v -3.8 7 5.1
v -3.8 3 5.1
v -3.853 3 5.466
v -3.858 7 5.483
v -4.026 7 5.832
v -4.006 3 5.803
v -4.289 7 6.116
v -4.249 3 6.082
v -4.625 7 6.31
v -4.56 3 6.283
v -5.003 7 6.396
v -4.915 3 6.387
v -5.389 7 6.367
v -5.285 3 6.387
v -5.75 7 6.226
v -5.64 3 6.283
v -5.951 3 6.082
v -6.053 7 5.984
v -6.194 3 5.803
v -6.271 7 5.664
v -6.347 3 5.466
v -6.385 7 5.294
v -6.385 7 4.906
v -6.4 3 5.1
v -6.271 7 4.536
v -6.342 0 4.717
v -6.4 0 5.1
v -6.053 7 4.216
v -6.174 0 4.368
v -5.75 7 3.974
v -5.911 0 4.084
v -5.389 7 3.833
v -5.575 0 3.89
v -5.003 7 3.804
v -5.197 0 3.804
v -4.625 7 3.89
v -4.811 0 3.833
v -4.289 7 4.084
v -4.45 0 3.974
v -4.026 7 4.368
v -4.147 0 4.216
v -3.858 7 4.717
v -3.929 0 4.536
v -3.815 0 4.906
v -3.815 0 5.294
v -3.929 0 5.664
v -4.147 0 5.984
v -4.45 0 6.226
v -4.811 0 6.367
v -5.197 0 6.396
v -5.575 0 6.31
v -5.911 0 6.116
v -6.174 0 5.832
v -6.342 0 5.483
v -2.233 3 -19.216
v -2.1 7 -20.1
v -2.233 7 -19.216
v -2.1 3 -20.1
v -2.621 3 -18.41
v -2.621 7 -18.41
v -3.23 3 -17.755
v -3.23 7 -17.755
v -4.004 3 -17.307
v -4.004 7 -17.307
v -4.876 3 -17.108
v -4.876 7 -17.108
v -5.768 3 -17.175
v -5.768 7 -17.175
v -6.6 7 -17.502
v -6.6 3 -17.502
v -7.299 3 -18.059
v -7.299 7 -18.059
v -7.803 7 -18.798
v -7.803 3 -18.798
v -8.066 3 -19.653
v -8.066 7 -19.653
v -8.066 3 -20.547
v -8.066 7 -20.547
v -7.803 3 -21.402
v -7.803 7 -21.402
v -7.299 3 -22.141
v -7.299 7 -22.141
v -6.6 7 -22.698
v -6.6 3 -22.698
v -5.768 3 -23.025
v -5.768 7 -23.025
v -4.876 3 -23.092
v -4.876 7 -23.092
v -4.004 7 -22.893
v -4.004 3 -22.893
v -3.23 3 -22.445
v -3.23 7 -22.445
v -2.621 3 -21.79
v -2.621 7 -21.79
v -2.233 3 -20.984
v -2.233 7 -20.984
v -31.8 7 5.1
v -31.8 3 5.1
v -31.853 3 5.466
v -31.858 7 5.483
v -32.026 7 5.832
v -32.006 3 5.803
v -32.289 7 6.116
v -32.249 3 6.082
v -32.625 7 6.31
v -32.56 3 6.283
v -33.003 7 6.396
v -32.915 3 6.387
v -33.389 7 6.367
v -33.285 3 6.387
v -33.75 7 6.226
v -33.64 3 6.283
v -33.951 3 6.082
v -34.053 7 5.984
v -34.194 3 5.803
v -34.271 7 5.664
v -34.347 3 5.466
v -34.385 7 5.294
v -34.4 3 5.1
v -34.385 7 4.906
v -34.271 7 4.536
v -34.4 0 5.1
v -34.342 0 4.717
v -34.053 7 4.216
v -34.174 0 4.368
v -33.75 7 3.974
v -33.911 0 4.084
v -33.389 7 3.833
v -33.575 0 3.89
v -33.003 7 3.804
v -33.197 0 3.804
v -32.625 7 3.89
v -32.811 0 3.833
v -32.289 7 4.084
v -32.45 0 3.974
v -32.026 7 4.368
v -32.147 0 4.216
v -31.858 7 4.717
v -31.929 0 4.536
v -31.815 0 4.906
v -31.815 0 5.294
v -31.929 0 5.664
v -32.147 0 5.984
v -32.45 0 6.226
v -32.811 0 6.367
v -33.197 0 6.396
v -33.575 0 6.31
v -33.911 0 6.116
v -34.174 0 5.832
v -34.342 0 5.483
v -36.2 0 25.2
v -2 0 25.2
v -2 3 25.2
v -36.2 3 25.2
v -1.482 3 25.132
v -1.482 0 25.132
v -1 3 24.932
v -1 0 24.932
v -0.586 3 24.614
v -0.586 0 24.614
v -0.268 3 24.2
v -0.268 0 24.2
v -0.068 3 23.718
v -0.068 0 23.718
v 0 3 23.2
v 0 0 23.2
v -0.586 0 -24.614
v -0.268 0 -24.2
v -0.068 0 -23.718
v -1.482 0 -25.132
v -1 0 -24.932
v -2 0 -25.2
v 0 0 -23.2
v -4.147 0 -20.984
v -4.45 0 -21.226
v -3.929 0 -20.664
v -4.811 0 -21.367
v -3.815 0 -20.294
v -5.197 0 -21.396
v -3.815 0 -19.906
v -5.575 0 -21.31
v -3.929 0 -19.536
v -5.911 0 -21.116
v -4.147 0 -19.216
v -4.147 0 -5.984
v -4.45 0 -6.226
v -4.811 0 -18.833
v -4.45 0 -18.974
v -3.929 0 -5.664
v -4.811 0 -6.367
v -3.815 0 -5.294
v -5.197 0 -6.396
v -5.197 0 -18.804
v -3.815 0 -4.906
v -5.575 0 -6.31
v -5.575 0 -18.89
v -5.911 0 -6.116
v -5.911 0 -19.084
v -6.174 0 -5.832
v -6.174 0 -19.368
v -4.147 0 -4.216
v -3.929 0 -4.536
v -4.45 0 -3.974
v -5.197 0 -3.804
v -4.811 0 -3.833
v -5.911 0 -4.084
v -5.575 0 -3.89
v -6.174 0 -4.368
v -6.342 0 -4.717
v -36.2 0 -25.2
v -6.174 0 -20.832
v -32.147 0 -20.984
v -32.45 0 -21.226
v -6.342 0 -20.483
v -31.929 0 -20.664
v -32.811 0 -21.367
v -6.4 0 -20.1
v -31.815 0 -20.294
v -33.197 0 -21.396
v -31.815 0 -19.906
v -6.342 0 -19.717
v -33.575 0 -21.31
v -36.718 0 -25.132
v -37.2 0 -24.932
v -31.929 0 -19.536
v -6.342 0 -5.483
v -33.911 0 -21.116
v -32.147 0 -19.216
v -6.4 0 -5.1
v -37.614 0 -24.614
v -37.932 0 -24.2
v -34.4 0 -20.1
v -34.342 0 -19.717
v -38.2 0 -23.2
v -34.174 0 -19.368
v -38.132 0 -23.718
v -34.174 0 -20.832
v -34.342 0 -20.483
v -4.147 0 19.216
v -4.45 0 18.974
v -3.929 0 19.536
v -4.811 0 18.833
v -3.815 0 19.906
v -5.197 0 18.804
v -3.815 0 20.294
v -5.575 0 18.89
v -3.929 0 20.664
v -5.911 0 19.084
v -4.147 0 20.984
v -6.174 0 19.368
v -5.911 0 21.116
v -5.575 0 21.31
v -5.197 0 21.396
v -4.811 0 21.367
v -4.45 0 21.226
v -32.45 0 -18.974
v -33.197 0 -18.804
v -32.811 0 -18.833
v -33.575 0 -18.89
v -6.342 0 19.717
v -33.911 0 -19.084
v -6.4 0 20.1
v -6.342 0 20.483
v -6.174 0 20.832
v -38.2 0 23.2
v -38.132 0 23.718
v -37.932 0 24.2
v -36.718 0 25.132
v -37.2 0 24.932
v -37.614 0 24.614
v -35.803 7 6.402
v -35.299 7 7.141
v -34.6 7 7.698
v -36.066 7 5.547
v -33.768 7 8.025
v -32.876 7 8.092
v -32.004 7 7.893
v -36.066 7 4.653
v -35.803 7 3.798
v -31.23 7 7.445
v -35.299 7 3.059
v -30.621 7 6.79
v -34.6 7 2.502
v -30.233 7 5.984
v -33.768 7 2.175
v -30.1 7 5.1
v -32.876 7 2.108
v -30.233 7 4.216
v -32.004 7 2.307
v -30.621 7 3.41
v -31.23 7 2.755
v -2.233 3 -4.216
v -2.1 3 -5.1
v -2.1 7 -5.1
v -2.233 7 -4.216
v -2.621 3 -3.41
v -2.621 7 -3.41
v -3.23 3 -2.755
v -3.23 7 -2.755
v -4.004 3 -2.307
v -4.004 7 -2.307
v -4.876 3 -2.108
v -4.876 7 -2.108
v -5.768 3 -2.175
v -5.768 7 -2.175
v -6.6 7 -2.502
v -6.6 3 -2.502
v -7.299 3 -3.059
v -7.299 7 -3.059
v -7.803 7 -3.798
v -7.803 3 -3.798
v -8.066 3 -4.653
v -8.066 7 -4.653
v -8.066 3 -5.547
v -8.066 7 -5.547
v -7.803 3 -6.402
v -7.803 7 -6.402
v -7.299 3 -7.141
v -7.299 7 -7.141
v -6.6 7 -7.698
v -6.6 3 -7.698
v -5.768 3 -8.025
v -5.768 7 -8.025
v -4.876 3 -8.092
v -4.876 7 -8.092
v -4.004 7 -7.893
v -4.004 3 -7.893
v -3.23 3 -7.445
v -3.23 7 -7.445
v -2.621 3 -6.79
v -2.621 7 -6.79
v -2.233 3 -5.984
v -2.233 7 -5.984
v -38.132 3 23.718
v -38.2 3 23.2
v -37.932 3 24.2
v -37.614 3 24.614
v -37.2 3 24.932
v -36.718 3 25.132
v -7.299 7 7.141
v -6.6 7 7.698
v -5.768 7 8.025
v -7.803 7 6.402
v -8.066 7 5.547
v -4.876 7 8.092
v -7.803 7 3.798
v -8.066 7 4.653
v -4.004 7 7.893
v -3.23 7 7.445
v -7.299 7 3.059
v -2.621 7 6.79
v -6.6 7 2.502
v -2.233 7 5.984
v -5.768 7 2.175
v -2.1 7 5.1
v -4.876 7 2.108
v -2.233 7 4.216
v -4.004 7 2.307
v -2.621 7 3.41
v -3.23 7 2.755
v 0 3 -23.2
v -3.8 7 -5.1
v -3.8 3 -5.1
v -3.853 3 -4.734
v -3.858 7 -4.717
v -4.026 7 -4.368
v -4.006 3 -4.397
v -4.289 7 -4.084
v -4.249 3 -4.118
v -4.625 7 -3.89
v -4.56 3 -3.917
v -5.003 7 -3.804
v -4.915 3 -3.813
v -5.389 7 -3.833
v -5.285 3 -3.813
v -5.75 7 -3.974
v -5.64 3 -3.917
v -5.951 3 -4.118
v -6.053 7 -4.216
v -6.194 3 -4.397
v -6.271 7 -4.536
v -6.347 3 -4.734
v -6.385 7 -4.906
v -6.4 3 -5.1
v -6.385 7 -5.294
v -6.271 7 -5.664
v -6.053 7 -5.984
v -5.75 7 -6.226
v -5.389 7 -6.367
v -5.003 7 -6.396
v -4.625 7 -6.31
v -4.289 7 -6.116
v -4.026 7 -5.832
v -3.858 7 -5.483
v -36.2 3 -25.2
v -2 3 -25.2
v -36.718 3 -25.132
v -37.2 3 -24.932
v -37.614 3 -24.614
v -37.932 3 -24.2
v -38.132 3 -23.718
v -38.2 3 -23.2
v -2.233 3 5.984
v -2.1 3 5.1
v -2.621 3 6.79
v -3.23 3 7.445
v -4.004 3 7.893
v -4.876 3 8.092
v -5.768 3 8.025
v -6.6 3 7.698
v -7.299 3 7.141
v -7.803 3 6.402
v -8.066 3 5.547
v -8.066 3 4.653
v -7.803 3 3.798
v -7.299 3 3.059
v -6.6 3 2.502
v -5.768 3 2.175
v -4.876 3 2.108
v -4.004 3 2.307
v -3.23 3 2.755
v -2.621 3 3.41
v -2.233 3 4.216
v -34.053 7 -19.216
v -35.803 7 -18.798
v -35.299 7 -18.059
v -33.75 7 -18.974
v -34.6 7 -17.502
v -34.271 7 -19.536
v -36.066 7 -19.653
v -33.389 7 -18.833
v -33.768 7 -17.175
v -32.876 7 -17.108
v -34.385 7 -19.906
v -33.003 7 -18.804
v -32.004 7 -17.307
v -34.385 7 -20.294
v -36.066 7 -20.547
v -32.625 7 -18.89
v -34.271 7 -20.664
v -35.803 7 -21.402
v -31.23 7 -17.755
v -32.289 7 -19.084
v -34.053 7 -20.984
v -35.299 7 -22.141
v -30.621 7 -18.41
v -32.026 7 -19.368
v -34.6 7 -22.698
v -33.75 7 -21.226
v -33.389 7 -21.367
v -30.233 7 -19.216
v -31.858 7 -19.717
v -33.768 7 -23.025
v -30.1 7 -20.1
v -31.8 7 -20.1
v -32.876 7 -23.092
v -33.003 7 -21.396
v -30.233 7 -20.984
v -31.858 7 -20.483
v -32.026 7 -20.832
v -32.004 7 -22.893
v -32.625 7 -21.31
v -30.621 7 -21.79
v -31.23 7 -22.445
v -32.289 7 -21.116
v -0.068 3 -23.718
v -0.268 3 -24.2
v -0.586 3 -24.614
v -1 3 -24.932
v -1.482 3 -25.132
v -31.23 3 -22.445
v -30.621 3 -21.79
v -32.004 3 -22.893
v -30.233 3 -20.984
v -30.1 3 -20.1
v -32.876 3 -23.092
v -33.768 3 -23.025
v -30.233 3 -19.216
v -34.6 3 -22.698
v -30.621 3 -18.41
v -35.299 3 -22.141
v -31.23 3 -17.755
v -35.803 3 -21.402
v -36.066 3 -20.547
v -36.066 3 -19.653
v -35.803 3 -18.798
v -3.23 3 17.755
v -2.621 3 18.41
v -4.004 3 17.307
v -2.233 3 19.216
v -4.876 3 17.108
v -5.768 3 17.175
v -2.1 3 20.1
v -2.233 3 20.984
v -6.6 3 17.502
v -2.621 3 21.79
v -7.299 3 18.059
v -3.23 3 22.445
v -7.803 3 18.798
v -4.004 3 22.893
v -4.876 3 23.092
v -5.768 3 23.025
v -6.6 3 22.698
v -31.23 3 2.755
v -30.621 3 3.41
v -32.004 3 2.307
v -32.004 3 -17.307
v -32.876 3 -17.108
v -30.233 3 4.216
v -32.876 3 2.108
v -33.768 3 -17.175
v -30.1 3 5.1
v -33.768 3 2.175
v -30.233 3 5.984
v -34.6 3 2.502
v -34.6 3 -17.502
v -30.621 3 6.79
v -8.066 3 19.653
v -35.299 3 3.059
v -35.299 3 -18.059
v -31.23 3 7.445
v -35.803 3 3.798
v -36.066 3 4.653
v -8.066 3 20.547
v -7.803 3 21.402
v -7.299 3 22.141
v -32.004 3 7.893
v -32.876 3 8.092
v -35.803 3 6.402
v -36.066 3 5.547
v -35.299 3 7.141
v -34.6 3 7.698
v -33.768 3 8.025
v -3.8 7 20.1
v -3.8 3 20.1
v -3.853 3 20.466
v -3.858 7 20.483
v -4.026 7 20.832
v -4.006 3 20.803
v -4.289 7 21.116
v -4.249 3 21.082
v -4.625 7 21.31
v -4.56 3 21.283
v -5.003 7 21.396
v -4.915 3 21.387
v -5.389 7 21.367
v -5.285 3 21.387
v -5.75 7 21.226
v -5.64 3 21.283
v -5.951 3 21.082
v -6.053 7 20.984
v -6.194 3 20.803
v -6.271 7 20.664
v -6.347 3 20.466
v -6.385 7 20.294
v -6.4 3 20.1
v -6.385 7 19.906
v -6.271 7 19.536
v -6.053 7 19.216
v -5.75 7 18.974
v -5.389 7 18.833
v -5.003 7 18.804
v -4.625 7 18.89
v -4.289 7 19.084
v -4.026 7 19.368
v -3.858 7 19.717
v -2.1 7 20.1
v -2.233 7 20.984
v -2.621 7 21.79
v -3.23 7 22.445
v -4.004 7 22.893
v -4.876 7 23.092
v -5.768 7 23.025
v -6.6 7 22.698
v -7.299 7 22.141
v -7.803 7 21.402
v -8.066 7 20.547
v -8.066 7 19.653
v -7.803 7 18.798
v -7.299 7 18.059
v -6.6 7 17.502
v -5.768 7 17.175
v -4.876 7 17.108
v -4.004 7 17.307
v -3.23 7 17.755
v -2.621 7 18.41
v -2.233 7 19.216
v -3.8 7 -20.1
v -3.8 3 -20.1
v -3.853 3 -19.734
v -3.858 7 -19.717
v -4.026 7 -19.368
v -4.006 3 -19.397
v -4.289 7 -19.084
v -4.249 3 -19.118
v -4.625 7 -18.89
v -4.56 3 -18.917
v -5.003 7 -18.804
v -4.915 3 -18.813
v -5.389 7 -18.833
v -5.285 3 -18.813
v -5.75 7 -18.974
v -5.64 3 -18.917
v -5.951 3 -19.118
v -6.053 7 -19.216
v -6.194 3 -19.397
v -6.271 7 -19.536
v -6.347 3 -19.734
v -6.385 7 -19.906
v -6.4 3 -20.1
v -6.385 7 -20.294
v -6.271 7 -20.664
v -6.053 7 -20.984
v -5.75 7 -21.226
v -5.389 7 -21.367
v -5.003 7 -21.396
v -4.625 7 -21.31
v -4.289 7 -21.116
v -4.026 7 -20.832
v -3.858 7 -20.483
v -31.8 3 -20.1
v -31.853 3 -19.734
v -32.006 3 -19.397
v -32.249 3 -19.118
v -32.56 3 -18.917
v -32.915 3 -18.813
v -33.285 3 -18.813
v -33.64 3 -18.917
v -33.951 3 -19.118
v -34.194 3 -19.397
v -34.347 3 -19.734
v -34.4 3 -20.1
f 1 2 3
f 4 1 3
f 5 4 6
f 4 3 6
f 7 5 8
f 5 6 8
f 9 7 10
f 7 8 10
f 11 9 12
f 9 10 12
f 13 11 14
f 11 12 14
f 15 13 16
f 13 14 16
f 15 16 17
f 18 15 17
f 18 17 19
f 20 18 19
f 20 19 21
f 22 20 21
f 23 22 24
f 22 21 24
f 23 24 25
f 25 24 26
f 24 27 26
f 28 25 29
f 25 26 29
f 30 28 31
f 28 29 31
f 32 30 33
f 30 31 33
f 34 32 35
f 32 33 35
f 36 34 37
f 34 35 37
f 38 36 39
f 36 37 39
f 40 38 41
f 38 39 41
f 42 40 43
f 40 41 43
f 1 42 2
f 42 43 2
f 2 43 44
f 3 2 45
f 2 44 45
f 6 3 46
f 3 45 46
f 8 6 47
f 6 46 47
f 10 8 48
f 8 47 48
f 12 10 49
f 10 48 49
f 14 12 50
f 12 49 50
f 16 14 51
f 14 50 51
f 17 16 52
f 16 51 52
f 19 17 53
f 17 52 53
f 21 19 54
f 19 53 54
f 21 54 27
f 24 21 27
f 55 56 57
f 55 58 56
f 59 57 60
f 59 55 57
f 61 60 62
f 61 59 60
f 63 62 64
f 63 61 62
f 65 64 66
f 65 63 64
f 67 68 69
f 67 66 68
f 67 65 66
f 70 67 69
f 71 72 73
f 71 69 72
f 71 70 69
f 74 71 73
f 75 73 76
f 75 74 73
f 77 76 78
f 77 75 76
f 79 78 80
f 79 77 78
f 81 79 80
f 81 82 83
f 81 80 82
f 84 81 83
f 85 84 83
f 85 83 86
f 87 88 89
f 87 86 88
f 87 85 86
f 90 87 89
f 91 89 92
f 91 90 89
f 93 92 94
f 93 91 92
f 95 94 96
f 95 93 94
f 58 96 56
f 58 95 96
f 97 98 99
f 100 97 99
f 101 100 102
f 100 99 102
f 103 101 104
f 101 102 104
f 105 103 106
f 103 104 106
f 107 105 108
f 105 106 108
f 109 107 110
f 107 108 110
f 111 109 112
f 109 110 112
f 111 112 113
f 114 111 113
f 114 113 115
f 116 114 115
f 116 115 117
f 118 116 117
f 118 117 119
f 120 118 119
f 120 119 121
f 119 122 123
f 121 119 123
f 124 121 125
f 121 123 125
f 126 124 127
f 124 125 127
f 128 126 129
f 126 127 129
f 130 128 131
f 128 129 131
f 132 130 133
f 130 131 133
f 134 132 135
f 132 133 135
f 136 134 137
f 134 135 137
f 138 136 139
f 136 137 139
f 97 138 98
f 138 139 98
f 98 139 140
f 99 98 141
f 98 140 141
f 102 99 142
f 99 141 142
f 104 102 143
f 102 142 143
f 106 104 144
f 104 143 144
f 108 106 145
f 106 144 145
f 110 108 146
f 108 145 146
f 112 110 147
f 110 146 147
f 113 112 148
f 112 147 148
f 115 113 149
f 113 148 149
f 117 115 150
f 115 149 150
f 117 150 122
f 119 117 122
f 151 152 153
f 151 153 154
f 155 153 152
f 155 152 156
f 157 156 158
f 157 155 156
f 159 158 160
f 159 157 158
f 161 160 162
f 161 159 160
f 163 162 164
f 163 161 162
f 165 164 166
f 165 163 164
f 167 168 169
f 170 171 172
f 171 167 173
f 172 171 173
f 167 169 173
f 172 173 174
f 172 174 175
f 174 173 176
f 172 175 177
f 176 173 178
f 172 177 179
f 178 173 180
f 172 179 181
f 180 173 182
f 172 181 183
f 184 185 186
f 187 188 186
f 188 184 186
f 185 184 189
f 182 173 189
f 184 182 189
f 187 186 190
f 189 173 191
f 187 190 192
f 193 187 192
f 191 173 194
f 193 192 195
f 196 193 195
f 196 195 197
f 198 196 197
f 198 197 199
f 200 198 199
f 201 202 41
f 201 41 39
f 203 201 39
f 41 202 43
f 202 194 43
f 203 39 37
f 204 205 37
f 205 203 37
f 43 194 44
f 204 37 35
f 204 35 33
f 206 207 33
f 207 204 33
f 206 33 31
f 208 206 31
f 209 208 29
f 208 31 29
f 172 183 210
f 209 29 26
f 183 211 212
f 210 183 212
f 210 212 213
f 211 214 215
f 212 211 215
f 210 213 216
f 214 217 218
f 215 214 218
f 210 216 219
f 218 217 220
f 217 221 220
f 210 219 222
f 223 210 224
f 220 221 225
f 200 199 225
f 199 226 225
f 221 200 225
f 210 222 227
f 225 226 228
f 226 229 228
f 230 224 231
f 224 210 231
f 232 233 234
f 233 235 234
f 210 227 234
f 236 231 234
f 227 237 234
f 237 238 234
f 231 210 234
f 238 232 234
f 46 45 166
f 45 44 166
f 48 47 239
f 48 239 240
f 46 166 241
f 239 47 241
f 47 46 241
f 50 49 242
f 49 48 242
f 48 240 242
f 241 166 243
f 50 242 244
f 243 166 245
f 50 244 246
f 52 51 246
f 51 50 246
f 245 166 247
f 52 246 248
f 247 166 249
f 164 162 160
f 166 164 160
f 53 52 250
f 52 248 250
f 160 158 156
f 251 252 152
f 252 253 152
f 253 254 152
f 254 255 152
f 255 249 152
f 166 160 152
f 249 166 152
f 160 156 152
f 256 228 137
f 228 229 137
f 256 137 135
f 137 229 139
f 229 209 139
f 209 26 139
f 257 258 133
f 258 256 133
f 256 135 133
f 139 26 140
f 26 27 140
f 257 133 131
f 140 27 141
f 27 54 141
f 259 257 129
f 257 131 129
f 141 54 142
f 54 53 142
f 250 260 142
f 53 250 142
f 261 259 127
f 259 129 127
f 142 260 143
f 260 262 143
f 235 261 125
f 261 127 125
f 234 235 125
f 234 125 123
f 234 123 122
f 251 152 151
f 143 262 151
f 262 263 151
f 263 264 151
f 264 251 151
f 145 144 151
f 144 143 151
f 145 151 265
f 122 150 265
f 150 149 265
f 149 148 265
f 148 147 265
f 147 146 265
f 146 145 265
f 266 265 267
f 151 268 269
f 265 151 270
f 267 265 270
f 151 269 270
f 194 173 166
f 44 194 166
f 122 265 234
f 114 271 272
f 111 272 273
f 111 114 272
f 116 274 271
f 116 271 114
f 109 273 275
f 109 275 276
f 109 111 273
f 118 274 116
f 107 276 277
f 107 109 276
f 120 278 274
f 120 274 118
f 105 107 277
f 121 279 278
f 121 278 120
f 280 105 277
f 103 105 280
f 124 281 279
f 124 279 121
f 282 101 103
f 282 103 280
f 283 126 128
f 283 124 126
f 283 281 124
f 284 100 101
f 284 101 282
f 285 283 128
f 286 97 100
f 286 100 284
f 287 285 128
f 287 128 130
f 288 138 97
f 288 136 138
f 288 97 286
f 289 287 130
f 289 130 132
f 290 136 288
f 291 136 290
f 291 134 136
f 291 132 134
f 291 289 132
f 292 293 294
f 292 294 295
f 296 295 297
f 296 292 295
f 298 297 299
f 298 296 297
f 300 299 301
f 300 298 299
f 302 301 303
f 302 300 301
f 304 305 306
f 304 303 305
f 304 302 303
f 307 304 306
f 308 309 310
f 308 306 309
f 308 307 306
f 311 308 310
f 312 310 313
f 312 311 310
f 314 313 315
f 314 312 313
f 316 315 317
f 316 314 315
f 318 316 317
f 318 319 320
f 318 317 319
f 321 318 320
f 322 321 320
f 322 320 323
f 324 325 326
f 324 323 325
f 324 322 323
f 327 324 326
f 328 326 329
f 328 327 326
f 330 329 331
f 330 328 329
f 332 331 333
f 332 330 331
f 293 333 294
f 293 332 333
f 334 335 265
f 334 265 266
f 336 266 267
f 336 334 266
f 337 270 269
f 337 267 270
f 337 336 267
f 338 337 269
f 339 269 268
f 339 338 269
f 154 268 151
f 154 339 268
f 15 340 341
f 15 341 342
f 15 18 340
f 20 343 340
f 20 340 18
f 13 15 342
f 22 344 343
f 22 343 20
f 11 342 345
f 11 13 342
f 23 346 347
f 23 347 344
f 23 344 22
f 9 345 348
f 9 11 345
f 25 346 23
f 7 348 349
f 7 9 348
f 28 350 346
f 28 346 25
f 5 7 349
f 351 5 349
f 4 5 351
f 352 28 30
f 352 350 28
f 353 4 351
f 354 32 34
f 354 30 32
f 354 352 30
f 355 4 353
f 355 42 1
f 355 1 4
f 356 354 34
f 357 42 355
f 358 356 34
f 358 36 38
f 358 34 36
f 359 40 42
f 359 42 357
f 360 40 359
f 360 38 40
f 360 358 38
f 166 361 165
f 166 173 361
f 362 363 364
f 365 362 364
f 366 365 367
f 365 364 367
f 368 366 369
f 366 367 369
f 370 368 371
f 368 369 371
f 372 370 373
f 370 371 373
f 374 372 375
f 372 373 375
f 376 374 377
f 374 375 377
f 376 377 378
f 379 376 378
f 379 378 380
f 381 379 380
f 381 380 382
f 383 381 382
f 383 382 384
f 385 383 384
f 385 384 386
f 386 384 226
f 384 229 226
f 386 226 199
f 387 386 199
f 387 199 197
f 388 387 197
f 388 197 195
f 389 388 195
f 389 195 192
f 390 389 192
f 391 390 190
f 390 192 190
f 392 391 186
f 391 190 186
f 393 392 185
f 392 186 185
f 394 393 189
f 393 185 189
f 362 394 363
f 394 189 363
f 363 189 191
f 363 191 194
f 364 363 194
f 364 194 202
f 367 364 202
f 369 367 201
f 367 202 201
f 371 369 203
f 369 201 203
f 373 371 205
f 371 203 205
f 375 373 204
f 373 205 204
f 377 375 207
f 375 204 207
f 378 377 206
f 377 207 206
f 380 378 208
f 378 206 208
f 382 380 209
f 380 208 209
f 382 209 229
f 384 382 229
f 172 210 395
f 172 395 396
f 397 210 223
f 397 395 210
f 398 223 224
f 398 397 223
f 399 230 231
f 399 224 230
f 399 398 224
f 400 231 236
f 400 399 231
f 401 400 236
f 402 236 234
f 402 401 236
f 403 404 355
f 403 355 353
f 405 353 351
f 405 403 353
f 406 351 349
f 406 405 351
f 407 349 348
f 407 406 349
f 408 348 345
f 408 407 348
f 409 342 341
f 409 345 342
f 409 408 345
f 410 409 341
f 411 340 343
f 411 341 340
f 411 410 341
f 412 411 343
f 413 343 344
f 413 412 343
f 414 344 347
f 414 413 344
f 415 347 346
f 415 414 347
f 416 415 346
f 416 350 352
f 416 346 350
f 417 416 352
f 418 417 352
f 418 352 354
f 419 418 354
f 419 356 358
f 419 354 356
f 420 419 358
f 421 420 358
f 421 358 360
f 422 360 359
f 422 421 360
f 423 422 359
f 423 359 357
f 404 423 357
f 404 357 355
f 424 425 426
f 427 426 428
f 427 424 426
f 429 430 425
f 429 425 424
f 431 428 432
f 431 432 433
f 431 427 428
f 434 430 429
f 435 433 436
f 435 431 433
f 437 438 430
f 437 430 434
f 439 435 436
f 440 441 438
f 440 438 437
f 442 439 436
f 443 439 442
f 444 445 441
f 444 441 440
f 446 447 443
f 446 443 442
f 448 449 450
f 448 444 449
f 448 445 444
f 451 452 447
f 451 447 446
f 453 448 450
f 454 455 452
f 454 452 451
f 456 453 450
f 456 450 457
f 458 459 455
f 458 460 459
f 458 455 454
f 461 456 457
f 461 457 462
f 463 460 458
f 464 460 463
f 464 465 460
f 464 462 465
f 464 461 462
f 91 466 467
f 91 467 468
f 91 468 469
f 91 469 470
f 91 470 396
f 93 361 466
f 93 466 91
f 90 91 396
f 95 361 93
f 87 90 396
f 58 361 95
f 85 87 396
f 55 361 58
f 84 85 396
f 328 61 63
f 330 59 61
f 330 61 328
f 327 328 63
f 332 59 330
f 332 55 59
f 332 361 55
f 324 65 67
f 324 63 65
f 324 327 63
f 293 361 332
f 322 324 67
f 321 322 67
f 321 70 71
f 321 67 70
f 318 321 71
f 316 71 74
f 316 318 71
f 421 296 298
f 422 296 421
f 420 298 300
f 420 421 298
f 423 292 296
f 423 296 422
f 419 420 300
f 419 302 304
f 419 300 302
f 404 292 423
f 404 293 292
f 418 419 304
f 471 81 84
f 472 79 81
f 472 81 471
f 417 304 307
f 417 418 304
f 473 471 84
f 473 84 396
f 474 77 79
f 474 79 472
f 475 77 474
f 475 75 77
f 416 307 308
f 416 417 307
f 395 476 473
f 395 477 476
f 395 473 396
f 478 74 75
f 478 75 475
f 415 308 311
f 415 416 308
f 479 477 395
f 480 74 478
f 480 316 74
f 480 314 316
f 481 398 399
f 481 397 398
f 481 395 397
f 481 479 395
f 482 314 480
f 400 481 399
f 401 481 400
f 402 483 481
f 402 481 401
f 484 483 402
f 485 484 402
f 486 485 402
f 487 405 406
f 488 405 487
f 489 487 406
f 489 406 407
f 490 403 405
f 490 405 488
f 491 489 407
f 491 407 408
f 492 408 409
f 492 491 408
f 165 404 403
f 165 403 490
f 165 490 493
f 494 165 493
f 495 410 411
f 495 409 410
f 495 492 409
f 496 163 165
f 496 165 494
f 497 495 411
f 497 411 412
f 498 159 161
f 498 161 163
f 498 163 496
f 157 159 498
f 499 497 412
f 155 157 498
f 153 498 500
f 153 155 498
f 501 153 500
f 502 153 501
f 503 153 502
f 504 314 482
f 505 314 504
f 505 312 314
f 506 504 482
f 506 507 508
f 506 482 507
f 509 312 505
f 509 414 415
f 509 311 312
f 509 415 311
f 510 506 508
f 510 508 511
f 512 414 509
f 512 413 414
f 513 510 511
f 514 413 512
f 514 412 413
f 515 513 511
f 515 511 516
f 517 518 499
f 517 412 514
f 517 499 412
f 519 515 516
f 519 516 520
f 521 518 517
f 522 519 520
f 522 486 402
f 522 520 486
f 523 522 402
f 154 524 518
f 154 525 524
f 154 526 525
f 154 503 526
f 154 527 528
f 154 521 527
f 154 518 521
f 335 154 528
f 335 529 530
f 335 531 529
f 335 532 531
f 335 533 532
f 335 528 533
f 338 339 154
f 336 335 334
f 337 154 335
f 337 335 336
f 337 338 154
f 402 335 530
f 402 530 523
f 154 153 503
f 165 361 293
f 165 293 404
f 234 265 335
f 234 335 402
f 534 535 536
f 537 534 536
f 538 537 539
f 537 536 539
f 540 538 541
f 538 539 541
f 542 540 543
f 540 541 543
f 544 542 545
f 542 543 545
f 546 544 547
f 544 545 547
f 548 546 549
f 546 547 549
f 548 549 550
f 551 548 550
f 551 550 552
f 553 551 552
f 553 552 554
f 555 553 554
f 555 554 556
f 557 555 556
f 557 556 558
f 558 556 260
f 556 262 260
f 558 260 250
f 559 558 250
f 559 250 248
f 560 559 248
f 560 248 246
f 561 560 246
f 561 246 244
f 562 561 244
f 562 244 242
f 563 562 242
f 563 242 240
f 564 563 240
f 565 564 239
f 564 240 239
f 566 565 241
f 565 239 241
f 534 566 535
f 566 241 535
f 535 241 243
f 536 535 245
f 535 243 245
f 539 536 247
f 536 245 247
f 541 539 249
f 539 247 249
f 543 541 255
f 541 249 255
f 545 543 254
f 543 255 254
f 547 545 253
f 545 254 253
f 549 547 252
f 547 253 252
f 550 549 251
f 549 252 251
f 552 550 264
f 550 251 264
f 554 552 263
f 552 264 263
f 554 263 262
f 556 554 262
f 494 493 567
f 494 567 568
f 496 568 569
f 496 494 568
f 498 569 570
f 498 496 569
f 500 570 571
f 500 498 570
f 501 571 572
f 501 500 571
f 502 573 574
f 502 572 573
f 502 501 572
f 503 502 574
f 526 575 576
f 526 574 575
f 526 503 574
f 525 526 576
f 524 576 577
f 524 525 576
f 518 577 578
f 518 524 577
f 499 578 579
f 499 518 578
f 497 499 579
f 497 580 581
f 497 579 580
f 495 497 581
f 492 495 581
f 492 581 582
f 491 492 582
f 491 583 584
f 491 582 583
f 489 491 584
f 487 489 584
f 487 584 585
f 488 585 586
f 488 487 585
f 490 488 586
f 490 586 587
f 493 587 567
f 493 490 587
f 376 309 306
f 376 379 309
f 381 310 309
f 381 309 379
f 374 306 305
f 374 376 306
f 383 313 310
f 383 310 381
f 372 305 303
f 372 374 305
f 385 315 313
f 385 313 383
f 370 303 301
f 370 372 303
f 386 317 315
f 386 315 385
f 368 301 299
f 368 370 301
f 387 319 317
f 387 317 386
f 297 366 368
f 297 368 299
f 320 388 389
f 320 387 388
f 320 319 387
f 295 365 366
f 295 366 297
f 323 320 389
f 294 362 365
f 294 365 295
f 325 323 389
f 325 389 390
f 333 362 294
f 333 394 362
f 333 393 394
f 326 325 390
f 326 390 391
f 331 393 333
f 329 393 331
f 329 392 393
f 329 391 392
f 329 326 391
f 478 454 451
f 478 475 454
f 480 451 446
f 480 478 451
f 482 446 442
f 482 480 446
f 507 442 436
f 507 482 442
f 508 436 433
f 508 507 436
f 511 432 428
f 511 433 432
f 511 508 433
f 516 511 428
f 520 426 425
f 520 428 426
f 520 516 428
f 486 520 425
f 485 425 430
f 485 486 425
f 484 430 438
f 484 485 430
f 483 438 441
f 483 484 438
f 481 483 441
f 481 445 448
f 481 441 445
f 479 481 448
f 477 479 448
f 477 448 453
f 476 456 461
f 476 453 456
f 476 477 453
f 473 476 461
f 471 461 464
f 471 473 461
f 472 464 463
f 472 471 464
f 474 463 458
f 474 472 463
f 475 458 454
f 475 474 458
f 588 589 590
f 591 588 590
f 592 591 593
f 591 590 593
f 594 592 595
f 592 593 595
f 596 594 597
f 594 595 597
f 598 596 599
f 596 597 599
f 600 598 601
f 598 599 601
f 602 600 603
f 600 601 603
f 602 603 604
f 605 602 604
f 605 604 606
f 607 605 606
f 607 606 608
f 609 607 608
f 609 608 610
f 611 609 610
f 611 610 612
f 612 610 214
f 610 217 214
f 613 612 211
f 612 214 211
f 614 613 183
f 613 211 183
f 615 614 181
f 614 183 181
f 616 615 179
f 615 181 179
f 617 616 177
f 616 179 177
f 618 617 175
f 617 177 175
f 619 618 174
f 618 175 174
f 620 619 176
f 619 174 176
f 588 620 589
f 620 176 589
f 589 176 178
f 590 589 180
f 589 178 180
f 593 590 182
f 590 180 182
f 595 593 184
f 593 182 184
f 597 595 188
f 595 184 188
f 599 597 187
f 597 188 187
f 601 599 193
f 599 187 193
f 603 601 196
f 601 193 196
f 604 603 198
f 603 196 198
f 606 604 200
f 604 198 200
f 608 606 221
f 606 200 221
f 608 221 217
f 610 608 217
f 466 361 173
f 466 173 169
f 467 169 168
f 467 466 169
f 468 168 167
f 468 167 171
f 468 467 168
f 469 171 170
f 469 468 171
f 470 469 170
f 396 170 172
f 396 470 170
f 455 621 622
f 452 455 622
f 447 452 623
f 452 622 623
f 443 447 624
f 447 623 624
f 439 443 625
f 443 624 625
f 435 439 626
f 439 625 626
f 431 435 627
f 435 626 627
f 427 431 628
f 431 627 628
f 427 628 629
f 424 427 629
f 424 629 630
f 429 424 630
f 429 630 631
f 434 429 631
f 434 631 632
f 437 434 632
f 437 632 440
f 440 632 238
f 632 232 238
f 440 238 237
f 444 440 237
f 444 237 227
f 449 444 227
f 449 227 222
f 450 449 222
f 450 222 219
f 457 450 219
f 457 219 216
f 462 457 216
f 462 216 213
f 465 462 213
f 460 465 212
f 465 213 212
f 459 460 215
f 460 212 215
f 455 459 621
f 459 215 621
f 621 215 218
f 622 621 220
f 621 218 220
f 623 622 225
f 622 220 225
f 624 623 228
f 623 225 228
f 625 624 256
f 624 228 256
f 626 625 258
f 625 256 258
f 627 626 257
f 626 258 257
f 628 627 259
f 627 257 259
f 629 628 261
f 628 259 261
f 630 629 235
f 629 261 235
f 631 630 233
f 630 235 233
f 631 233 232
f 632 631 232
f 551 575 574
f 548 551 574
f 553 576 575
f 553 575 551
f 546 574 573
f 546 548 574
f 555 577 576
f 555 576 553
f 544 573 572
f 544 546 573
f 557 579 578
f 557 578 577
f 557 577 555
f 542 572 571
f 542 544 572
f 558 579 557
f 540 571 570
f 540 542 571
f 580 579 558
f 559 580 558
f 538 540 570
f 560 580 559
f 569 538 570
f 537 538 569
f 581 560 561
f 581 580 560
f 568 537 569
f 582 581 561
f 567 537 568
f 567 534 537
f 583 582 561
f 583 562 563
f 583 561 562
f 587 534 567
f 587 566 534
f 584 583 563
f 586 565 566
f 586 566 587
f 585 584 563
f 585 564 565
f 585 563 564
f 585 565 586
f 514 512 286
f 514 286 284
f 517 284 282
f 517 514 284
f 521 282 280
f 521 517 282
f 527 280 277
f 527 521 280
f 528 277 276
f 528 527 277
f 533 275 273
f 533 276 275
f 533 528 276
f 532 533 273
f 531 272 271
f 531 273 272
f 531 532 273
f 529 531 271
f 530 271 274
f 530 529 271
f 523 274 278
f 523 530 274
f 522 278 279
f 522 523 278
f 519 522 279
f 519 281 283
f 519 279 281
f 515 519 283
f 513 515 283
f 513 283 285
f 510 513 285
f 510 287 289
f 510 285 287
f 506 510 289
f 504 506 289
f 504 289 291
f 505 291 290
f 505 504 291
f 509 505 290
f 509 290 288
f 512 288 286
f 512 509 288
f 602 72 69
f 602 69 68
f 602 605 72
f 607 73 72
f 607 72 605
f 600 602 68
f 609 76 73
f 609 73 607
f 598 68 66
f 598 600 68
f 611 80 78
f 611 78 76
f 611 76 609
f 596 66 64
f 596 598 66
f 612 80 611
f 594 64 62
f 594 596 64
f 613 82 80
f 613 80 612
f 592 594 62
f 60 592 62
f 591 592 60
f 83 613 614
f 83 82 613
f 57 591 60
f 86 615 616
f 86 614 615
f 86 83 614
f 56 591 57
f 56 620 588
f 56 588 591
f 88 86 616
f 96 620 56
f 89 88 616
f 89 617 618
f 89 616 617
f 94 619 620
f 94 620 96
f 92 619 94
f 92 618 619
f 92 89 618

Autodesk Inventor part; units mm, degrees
ref_plane "YZ Plane" through (0, 0, 0) normal (1, 0, 0) x (0, 1, 0)
ref_plane "XZ Plane" through (0, 0, 0) normal (0, 1, 0) x (-1, 0, 0)
ref_plane "XY Plane" through (0, 0, 0) normal (0, 0, 1) x (1, 0, 0)
sketch "Sketch1" plane through (0, 0, 0) normal (0, 1, 0) x (-1, 0, 0)
  line L0 (0, 0) -> (38.2, 0)
  line L1 (38.2, 0) -> (38.2, -25.2)
  line L2 (38.2, -25.2) -> (0, -25.2)
  line L3 (0, -25.2) -> (0, 0)
  circle A0 centre (33.1, -20.1) radius 1.3
  circle A1 centre (5.1, -5.1) radius 1.3
  circle A2 centre (5.1, -20.1) radius 1.3
  line L4 (0, 0) -> (38.2, -25.2) construction
  line L5 (38.2, 0) -> (0, -25.2) construction
  line L6 (5.1, -5.1) -> (33.1, -20.1) construction
  point P0 (19.1, -12.6)
  dimension "d1" = 15
  dimension "d2" = 28
  dimension "d3" = 2.6
  dimension "d4" = 2.6
  dimension "d5" = 2.6
  dimension "d18" = 25.2
  dimension "d19" = 38.2
extrude "Extrusion1" add sketch "Sketch1" along normal blind 3
sketch "Sketch2" plane through (0, 3, 0) normal (0, 1, 0) x (1, 0, 0)
  circle A0 centre (-5.1, 5.1) radius 1.3 projected
  circle A1 centre (-5.1, 5.1) radius 3
  circle A2 centre (-5.1, 20.1) radius 1.3 projected
  circle A3 centre (-5.1, 20.1) radius 3
  circle A4 centre (-33.1, 20.1) radius 1.3 projected
  circle A5 centre (-33.1, 20.1) radius 3
  point P0 (0, 0)
  dimension "d12" = 6
  dimension "d13" = 6
  dimension "d14" = 6
extrude "Extrusion2" add sketch "Sketch2" along normal blind 4
pattern_linear "Rectangular Pattern1" count 2 spacing 25.2 along (0, 0, 1) of "Extrusion1", "Extrusion2"
fillet "Fillet2" radius 2 4 edges at (0, 1.5, 25.2) (0, 1.5, -25.2) (-38.2, 1.5, -25.2) (-38.2, 1.5, 25.2)
equation "\"d4\" = d3"
equation "\"d5\" = d3"
equation "\"d13\" = d12"
equation "\"d14\" = d12"
equation "\"d7\" = d8"
equation "\"d8\" = 3"
properties part number "adc_board_rack"
